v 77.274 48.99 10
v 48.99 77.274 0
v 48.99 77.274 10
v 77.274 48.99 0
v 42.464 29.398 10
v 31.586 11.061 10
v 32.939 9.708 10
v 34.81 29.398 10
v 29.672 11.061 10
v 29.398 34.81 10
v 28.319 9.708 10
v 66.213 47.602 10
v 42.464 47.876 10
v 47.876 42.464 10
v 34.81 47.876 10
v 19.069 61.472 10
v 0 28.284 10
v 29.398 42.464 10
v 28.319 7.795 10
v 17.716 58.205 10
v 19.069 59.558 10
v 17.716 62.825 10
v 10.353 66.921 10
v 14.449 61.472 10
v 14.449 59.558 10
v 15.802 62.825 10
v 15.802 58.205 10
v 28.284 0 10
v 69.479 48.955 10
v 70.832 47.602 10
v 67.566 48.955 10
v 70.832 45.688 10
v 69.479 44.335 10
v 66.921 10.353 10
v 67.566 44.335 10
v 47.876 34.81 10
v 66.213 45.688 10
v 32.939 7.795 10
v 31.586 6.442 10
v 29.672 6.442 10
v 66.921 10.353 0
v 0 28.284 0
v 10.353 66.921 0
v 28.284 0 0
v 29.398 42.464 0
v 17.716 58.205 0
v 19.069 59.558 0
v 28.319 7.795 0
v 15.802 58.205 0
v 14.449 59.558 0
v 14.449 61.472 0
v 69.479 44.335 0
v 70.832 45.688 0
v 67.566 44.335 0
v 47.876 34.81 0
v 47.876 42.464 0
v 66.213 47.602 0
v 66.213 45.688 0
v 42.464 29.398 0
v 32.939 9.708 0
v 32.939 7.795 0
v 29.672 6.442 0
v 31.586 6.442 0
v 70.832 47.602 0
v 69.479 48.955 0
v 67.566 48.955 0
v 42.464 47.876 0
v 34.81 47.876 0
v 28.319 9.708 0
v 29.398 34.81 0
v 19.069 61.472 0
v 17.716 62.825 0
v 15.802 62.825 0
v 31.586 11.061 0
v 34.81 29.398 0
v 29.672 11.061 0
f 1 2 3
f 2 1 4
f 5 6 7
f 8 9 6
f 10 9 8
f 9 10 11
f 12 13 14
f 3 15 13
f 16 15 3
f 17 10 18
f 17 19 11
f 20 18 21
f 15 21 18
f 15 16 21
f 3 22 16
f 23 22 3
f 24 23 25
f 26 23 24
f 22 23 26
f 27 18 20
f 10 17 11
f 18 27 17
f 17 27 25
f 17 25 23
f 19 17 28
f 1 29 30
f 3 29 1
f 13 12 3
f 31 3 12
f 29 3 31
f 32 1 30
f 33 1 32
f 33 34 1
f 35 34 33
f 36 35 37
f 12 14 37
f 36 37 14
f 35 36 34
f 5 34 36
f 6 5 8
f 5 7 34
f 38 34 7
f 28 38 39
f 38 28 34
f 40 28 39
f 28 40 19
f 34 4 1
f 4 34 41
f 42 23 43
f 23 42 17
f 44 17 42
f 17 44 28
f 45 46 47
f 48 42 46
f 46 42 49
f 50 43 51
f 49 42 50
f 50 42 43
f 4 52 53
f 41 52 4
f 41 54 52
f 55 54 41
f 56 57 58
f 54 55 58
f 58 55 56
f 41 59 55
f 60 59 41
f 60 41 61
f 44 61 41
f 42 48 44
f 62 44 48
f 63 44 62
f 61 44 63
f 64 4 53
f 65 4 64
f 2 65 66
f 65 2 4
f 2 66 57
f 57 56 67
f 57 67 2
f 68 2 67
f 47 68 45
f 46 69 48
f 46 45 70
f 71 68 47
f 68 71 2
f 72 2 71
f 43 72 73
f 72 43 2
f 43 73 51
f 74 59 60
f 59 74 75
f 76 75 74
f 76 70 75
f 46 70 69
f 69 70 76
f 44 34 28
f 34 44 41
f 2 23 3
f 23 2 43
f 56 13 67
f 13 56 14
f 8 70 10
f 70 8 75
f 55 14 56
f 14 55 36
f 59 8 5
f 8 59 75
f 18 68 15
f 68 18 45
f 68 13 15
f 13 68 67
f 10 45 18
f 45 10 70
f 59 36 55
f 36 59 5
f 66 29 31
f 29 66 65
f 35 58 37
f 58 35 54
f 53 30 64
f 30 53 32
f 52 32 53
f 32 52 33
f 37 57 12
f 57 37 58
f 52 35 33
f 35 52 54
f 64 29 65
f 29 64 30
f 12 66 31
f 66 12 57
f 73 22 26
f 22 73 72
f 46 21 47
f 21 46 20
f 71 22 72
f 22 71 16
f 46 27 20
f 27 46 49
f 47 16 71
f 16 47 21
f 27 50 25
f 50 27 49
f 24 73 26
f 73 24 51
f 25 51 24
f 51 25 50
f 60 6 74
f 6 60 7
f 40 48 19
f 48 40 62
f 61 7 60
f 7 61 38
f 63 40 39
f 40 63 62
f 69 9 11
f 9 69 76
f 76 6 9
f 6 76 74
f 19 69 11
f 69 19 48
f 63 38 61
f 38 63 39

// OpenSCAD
$fn = 32;

// ----------------------------------------------------------------------
// Polygon plate: 6-gon R40, 3 bolt windows
// ----------------------------------------------------------------------

// --- parameters (mm) ---
sides = 6;                // number of polygon sides
plate_r = 40;             // circumscribed radius of the polygon
bore_r = 10;              // centre bore radius
bolts = 3;                // number of bolt windows
ring_r = 30.94;           // bolt-circle radius
bolt_r = 2.5;             // bolt window radius
plate_t = 10;             // plate thickness, Z (extrusion height)

plate_d = 2 * plate_r;  // circumscribed diameter
bore_d = 2 * bore_r;  // centre bore diameter
bolt_d = 2 * bolt_r;  // bolt window diameter
ring_d = 2 * ring_r;  // bolt-circle diameter

profile = [[77.274, 48.99], [48.99, 77.274], [10.353, 66.921], [0, 28.284], [28.284, 0], [66.921, 10.353]];  // primary outline, 6 points, counter clockwise
void_1 = [[47.876, 42.464], [42.464, 47.876], [34.81, 47.876], [29.398, 42.464], [29.398, 34.81], [34.81, 29.398], [42.464, 29.398], [47.876, 34.81]];  // centre bore, 8 points
void_2 = [[70.832, 47.602], [69.479, 48.955], [67.566, 48.955], [66.213, 47.602], [66.213, 45.688], [67.566, 44.335], [69.479, 44.335], [70.832, 45.688]];  // bolt window 1, 8 points
void_3 = [[19.069, 61.472], [17.716, 62.825], [15.802, 62.825], [14.449, 61.472], [14.449, 59.558], [15.802, 58.205], [17.716, 58.205], [19.069, 59.558]];  // bolt window 2, 8 points
void_4 = [[32.939, 9.708], [31.586, 11.061], [29.672, 11.061], [28.319, 9.708], [28.319, 7.795], [29.672, 6.442], [31.586, 6.442], [32.939, 7.795]];  // bolt window 3, 8 points

// --- the one profile operation ---
difference() {
  linear_extrude(height = plate_t) polygon(points = profile);
  translate([0, 0, -1])
    linear_extrude(height = plate_t + 2) polygon(points = void_1);
  translate([0, 0, -1])
    linear_extrude(height = plate_t + 2) polygon(points = void_2);
  translate([0, 0, -1])
    linear_extrude(height = plate_t + 2) polygon(points = void_3);
  translate([0, 0, -1])
    linear_extrude(height = plate_t + 2) polygon(points = void_4);
}
